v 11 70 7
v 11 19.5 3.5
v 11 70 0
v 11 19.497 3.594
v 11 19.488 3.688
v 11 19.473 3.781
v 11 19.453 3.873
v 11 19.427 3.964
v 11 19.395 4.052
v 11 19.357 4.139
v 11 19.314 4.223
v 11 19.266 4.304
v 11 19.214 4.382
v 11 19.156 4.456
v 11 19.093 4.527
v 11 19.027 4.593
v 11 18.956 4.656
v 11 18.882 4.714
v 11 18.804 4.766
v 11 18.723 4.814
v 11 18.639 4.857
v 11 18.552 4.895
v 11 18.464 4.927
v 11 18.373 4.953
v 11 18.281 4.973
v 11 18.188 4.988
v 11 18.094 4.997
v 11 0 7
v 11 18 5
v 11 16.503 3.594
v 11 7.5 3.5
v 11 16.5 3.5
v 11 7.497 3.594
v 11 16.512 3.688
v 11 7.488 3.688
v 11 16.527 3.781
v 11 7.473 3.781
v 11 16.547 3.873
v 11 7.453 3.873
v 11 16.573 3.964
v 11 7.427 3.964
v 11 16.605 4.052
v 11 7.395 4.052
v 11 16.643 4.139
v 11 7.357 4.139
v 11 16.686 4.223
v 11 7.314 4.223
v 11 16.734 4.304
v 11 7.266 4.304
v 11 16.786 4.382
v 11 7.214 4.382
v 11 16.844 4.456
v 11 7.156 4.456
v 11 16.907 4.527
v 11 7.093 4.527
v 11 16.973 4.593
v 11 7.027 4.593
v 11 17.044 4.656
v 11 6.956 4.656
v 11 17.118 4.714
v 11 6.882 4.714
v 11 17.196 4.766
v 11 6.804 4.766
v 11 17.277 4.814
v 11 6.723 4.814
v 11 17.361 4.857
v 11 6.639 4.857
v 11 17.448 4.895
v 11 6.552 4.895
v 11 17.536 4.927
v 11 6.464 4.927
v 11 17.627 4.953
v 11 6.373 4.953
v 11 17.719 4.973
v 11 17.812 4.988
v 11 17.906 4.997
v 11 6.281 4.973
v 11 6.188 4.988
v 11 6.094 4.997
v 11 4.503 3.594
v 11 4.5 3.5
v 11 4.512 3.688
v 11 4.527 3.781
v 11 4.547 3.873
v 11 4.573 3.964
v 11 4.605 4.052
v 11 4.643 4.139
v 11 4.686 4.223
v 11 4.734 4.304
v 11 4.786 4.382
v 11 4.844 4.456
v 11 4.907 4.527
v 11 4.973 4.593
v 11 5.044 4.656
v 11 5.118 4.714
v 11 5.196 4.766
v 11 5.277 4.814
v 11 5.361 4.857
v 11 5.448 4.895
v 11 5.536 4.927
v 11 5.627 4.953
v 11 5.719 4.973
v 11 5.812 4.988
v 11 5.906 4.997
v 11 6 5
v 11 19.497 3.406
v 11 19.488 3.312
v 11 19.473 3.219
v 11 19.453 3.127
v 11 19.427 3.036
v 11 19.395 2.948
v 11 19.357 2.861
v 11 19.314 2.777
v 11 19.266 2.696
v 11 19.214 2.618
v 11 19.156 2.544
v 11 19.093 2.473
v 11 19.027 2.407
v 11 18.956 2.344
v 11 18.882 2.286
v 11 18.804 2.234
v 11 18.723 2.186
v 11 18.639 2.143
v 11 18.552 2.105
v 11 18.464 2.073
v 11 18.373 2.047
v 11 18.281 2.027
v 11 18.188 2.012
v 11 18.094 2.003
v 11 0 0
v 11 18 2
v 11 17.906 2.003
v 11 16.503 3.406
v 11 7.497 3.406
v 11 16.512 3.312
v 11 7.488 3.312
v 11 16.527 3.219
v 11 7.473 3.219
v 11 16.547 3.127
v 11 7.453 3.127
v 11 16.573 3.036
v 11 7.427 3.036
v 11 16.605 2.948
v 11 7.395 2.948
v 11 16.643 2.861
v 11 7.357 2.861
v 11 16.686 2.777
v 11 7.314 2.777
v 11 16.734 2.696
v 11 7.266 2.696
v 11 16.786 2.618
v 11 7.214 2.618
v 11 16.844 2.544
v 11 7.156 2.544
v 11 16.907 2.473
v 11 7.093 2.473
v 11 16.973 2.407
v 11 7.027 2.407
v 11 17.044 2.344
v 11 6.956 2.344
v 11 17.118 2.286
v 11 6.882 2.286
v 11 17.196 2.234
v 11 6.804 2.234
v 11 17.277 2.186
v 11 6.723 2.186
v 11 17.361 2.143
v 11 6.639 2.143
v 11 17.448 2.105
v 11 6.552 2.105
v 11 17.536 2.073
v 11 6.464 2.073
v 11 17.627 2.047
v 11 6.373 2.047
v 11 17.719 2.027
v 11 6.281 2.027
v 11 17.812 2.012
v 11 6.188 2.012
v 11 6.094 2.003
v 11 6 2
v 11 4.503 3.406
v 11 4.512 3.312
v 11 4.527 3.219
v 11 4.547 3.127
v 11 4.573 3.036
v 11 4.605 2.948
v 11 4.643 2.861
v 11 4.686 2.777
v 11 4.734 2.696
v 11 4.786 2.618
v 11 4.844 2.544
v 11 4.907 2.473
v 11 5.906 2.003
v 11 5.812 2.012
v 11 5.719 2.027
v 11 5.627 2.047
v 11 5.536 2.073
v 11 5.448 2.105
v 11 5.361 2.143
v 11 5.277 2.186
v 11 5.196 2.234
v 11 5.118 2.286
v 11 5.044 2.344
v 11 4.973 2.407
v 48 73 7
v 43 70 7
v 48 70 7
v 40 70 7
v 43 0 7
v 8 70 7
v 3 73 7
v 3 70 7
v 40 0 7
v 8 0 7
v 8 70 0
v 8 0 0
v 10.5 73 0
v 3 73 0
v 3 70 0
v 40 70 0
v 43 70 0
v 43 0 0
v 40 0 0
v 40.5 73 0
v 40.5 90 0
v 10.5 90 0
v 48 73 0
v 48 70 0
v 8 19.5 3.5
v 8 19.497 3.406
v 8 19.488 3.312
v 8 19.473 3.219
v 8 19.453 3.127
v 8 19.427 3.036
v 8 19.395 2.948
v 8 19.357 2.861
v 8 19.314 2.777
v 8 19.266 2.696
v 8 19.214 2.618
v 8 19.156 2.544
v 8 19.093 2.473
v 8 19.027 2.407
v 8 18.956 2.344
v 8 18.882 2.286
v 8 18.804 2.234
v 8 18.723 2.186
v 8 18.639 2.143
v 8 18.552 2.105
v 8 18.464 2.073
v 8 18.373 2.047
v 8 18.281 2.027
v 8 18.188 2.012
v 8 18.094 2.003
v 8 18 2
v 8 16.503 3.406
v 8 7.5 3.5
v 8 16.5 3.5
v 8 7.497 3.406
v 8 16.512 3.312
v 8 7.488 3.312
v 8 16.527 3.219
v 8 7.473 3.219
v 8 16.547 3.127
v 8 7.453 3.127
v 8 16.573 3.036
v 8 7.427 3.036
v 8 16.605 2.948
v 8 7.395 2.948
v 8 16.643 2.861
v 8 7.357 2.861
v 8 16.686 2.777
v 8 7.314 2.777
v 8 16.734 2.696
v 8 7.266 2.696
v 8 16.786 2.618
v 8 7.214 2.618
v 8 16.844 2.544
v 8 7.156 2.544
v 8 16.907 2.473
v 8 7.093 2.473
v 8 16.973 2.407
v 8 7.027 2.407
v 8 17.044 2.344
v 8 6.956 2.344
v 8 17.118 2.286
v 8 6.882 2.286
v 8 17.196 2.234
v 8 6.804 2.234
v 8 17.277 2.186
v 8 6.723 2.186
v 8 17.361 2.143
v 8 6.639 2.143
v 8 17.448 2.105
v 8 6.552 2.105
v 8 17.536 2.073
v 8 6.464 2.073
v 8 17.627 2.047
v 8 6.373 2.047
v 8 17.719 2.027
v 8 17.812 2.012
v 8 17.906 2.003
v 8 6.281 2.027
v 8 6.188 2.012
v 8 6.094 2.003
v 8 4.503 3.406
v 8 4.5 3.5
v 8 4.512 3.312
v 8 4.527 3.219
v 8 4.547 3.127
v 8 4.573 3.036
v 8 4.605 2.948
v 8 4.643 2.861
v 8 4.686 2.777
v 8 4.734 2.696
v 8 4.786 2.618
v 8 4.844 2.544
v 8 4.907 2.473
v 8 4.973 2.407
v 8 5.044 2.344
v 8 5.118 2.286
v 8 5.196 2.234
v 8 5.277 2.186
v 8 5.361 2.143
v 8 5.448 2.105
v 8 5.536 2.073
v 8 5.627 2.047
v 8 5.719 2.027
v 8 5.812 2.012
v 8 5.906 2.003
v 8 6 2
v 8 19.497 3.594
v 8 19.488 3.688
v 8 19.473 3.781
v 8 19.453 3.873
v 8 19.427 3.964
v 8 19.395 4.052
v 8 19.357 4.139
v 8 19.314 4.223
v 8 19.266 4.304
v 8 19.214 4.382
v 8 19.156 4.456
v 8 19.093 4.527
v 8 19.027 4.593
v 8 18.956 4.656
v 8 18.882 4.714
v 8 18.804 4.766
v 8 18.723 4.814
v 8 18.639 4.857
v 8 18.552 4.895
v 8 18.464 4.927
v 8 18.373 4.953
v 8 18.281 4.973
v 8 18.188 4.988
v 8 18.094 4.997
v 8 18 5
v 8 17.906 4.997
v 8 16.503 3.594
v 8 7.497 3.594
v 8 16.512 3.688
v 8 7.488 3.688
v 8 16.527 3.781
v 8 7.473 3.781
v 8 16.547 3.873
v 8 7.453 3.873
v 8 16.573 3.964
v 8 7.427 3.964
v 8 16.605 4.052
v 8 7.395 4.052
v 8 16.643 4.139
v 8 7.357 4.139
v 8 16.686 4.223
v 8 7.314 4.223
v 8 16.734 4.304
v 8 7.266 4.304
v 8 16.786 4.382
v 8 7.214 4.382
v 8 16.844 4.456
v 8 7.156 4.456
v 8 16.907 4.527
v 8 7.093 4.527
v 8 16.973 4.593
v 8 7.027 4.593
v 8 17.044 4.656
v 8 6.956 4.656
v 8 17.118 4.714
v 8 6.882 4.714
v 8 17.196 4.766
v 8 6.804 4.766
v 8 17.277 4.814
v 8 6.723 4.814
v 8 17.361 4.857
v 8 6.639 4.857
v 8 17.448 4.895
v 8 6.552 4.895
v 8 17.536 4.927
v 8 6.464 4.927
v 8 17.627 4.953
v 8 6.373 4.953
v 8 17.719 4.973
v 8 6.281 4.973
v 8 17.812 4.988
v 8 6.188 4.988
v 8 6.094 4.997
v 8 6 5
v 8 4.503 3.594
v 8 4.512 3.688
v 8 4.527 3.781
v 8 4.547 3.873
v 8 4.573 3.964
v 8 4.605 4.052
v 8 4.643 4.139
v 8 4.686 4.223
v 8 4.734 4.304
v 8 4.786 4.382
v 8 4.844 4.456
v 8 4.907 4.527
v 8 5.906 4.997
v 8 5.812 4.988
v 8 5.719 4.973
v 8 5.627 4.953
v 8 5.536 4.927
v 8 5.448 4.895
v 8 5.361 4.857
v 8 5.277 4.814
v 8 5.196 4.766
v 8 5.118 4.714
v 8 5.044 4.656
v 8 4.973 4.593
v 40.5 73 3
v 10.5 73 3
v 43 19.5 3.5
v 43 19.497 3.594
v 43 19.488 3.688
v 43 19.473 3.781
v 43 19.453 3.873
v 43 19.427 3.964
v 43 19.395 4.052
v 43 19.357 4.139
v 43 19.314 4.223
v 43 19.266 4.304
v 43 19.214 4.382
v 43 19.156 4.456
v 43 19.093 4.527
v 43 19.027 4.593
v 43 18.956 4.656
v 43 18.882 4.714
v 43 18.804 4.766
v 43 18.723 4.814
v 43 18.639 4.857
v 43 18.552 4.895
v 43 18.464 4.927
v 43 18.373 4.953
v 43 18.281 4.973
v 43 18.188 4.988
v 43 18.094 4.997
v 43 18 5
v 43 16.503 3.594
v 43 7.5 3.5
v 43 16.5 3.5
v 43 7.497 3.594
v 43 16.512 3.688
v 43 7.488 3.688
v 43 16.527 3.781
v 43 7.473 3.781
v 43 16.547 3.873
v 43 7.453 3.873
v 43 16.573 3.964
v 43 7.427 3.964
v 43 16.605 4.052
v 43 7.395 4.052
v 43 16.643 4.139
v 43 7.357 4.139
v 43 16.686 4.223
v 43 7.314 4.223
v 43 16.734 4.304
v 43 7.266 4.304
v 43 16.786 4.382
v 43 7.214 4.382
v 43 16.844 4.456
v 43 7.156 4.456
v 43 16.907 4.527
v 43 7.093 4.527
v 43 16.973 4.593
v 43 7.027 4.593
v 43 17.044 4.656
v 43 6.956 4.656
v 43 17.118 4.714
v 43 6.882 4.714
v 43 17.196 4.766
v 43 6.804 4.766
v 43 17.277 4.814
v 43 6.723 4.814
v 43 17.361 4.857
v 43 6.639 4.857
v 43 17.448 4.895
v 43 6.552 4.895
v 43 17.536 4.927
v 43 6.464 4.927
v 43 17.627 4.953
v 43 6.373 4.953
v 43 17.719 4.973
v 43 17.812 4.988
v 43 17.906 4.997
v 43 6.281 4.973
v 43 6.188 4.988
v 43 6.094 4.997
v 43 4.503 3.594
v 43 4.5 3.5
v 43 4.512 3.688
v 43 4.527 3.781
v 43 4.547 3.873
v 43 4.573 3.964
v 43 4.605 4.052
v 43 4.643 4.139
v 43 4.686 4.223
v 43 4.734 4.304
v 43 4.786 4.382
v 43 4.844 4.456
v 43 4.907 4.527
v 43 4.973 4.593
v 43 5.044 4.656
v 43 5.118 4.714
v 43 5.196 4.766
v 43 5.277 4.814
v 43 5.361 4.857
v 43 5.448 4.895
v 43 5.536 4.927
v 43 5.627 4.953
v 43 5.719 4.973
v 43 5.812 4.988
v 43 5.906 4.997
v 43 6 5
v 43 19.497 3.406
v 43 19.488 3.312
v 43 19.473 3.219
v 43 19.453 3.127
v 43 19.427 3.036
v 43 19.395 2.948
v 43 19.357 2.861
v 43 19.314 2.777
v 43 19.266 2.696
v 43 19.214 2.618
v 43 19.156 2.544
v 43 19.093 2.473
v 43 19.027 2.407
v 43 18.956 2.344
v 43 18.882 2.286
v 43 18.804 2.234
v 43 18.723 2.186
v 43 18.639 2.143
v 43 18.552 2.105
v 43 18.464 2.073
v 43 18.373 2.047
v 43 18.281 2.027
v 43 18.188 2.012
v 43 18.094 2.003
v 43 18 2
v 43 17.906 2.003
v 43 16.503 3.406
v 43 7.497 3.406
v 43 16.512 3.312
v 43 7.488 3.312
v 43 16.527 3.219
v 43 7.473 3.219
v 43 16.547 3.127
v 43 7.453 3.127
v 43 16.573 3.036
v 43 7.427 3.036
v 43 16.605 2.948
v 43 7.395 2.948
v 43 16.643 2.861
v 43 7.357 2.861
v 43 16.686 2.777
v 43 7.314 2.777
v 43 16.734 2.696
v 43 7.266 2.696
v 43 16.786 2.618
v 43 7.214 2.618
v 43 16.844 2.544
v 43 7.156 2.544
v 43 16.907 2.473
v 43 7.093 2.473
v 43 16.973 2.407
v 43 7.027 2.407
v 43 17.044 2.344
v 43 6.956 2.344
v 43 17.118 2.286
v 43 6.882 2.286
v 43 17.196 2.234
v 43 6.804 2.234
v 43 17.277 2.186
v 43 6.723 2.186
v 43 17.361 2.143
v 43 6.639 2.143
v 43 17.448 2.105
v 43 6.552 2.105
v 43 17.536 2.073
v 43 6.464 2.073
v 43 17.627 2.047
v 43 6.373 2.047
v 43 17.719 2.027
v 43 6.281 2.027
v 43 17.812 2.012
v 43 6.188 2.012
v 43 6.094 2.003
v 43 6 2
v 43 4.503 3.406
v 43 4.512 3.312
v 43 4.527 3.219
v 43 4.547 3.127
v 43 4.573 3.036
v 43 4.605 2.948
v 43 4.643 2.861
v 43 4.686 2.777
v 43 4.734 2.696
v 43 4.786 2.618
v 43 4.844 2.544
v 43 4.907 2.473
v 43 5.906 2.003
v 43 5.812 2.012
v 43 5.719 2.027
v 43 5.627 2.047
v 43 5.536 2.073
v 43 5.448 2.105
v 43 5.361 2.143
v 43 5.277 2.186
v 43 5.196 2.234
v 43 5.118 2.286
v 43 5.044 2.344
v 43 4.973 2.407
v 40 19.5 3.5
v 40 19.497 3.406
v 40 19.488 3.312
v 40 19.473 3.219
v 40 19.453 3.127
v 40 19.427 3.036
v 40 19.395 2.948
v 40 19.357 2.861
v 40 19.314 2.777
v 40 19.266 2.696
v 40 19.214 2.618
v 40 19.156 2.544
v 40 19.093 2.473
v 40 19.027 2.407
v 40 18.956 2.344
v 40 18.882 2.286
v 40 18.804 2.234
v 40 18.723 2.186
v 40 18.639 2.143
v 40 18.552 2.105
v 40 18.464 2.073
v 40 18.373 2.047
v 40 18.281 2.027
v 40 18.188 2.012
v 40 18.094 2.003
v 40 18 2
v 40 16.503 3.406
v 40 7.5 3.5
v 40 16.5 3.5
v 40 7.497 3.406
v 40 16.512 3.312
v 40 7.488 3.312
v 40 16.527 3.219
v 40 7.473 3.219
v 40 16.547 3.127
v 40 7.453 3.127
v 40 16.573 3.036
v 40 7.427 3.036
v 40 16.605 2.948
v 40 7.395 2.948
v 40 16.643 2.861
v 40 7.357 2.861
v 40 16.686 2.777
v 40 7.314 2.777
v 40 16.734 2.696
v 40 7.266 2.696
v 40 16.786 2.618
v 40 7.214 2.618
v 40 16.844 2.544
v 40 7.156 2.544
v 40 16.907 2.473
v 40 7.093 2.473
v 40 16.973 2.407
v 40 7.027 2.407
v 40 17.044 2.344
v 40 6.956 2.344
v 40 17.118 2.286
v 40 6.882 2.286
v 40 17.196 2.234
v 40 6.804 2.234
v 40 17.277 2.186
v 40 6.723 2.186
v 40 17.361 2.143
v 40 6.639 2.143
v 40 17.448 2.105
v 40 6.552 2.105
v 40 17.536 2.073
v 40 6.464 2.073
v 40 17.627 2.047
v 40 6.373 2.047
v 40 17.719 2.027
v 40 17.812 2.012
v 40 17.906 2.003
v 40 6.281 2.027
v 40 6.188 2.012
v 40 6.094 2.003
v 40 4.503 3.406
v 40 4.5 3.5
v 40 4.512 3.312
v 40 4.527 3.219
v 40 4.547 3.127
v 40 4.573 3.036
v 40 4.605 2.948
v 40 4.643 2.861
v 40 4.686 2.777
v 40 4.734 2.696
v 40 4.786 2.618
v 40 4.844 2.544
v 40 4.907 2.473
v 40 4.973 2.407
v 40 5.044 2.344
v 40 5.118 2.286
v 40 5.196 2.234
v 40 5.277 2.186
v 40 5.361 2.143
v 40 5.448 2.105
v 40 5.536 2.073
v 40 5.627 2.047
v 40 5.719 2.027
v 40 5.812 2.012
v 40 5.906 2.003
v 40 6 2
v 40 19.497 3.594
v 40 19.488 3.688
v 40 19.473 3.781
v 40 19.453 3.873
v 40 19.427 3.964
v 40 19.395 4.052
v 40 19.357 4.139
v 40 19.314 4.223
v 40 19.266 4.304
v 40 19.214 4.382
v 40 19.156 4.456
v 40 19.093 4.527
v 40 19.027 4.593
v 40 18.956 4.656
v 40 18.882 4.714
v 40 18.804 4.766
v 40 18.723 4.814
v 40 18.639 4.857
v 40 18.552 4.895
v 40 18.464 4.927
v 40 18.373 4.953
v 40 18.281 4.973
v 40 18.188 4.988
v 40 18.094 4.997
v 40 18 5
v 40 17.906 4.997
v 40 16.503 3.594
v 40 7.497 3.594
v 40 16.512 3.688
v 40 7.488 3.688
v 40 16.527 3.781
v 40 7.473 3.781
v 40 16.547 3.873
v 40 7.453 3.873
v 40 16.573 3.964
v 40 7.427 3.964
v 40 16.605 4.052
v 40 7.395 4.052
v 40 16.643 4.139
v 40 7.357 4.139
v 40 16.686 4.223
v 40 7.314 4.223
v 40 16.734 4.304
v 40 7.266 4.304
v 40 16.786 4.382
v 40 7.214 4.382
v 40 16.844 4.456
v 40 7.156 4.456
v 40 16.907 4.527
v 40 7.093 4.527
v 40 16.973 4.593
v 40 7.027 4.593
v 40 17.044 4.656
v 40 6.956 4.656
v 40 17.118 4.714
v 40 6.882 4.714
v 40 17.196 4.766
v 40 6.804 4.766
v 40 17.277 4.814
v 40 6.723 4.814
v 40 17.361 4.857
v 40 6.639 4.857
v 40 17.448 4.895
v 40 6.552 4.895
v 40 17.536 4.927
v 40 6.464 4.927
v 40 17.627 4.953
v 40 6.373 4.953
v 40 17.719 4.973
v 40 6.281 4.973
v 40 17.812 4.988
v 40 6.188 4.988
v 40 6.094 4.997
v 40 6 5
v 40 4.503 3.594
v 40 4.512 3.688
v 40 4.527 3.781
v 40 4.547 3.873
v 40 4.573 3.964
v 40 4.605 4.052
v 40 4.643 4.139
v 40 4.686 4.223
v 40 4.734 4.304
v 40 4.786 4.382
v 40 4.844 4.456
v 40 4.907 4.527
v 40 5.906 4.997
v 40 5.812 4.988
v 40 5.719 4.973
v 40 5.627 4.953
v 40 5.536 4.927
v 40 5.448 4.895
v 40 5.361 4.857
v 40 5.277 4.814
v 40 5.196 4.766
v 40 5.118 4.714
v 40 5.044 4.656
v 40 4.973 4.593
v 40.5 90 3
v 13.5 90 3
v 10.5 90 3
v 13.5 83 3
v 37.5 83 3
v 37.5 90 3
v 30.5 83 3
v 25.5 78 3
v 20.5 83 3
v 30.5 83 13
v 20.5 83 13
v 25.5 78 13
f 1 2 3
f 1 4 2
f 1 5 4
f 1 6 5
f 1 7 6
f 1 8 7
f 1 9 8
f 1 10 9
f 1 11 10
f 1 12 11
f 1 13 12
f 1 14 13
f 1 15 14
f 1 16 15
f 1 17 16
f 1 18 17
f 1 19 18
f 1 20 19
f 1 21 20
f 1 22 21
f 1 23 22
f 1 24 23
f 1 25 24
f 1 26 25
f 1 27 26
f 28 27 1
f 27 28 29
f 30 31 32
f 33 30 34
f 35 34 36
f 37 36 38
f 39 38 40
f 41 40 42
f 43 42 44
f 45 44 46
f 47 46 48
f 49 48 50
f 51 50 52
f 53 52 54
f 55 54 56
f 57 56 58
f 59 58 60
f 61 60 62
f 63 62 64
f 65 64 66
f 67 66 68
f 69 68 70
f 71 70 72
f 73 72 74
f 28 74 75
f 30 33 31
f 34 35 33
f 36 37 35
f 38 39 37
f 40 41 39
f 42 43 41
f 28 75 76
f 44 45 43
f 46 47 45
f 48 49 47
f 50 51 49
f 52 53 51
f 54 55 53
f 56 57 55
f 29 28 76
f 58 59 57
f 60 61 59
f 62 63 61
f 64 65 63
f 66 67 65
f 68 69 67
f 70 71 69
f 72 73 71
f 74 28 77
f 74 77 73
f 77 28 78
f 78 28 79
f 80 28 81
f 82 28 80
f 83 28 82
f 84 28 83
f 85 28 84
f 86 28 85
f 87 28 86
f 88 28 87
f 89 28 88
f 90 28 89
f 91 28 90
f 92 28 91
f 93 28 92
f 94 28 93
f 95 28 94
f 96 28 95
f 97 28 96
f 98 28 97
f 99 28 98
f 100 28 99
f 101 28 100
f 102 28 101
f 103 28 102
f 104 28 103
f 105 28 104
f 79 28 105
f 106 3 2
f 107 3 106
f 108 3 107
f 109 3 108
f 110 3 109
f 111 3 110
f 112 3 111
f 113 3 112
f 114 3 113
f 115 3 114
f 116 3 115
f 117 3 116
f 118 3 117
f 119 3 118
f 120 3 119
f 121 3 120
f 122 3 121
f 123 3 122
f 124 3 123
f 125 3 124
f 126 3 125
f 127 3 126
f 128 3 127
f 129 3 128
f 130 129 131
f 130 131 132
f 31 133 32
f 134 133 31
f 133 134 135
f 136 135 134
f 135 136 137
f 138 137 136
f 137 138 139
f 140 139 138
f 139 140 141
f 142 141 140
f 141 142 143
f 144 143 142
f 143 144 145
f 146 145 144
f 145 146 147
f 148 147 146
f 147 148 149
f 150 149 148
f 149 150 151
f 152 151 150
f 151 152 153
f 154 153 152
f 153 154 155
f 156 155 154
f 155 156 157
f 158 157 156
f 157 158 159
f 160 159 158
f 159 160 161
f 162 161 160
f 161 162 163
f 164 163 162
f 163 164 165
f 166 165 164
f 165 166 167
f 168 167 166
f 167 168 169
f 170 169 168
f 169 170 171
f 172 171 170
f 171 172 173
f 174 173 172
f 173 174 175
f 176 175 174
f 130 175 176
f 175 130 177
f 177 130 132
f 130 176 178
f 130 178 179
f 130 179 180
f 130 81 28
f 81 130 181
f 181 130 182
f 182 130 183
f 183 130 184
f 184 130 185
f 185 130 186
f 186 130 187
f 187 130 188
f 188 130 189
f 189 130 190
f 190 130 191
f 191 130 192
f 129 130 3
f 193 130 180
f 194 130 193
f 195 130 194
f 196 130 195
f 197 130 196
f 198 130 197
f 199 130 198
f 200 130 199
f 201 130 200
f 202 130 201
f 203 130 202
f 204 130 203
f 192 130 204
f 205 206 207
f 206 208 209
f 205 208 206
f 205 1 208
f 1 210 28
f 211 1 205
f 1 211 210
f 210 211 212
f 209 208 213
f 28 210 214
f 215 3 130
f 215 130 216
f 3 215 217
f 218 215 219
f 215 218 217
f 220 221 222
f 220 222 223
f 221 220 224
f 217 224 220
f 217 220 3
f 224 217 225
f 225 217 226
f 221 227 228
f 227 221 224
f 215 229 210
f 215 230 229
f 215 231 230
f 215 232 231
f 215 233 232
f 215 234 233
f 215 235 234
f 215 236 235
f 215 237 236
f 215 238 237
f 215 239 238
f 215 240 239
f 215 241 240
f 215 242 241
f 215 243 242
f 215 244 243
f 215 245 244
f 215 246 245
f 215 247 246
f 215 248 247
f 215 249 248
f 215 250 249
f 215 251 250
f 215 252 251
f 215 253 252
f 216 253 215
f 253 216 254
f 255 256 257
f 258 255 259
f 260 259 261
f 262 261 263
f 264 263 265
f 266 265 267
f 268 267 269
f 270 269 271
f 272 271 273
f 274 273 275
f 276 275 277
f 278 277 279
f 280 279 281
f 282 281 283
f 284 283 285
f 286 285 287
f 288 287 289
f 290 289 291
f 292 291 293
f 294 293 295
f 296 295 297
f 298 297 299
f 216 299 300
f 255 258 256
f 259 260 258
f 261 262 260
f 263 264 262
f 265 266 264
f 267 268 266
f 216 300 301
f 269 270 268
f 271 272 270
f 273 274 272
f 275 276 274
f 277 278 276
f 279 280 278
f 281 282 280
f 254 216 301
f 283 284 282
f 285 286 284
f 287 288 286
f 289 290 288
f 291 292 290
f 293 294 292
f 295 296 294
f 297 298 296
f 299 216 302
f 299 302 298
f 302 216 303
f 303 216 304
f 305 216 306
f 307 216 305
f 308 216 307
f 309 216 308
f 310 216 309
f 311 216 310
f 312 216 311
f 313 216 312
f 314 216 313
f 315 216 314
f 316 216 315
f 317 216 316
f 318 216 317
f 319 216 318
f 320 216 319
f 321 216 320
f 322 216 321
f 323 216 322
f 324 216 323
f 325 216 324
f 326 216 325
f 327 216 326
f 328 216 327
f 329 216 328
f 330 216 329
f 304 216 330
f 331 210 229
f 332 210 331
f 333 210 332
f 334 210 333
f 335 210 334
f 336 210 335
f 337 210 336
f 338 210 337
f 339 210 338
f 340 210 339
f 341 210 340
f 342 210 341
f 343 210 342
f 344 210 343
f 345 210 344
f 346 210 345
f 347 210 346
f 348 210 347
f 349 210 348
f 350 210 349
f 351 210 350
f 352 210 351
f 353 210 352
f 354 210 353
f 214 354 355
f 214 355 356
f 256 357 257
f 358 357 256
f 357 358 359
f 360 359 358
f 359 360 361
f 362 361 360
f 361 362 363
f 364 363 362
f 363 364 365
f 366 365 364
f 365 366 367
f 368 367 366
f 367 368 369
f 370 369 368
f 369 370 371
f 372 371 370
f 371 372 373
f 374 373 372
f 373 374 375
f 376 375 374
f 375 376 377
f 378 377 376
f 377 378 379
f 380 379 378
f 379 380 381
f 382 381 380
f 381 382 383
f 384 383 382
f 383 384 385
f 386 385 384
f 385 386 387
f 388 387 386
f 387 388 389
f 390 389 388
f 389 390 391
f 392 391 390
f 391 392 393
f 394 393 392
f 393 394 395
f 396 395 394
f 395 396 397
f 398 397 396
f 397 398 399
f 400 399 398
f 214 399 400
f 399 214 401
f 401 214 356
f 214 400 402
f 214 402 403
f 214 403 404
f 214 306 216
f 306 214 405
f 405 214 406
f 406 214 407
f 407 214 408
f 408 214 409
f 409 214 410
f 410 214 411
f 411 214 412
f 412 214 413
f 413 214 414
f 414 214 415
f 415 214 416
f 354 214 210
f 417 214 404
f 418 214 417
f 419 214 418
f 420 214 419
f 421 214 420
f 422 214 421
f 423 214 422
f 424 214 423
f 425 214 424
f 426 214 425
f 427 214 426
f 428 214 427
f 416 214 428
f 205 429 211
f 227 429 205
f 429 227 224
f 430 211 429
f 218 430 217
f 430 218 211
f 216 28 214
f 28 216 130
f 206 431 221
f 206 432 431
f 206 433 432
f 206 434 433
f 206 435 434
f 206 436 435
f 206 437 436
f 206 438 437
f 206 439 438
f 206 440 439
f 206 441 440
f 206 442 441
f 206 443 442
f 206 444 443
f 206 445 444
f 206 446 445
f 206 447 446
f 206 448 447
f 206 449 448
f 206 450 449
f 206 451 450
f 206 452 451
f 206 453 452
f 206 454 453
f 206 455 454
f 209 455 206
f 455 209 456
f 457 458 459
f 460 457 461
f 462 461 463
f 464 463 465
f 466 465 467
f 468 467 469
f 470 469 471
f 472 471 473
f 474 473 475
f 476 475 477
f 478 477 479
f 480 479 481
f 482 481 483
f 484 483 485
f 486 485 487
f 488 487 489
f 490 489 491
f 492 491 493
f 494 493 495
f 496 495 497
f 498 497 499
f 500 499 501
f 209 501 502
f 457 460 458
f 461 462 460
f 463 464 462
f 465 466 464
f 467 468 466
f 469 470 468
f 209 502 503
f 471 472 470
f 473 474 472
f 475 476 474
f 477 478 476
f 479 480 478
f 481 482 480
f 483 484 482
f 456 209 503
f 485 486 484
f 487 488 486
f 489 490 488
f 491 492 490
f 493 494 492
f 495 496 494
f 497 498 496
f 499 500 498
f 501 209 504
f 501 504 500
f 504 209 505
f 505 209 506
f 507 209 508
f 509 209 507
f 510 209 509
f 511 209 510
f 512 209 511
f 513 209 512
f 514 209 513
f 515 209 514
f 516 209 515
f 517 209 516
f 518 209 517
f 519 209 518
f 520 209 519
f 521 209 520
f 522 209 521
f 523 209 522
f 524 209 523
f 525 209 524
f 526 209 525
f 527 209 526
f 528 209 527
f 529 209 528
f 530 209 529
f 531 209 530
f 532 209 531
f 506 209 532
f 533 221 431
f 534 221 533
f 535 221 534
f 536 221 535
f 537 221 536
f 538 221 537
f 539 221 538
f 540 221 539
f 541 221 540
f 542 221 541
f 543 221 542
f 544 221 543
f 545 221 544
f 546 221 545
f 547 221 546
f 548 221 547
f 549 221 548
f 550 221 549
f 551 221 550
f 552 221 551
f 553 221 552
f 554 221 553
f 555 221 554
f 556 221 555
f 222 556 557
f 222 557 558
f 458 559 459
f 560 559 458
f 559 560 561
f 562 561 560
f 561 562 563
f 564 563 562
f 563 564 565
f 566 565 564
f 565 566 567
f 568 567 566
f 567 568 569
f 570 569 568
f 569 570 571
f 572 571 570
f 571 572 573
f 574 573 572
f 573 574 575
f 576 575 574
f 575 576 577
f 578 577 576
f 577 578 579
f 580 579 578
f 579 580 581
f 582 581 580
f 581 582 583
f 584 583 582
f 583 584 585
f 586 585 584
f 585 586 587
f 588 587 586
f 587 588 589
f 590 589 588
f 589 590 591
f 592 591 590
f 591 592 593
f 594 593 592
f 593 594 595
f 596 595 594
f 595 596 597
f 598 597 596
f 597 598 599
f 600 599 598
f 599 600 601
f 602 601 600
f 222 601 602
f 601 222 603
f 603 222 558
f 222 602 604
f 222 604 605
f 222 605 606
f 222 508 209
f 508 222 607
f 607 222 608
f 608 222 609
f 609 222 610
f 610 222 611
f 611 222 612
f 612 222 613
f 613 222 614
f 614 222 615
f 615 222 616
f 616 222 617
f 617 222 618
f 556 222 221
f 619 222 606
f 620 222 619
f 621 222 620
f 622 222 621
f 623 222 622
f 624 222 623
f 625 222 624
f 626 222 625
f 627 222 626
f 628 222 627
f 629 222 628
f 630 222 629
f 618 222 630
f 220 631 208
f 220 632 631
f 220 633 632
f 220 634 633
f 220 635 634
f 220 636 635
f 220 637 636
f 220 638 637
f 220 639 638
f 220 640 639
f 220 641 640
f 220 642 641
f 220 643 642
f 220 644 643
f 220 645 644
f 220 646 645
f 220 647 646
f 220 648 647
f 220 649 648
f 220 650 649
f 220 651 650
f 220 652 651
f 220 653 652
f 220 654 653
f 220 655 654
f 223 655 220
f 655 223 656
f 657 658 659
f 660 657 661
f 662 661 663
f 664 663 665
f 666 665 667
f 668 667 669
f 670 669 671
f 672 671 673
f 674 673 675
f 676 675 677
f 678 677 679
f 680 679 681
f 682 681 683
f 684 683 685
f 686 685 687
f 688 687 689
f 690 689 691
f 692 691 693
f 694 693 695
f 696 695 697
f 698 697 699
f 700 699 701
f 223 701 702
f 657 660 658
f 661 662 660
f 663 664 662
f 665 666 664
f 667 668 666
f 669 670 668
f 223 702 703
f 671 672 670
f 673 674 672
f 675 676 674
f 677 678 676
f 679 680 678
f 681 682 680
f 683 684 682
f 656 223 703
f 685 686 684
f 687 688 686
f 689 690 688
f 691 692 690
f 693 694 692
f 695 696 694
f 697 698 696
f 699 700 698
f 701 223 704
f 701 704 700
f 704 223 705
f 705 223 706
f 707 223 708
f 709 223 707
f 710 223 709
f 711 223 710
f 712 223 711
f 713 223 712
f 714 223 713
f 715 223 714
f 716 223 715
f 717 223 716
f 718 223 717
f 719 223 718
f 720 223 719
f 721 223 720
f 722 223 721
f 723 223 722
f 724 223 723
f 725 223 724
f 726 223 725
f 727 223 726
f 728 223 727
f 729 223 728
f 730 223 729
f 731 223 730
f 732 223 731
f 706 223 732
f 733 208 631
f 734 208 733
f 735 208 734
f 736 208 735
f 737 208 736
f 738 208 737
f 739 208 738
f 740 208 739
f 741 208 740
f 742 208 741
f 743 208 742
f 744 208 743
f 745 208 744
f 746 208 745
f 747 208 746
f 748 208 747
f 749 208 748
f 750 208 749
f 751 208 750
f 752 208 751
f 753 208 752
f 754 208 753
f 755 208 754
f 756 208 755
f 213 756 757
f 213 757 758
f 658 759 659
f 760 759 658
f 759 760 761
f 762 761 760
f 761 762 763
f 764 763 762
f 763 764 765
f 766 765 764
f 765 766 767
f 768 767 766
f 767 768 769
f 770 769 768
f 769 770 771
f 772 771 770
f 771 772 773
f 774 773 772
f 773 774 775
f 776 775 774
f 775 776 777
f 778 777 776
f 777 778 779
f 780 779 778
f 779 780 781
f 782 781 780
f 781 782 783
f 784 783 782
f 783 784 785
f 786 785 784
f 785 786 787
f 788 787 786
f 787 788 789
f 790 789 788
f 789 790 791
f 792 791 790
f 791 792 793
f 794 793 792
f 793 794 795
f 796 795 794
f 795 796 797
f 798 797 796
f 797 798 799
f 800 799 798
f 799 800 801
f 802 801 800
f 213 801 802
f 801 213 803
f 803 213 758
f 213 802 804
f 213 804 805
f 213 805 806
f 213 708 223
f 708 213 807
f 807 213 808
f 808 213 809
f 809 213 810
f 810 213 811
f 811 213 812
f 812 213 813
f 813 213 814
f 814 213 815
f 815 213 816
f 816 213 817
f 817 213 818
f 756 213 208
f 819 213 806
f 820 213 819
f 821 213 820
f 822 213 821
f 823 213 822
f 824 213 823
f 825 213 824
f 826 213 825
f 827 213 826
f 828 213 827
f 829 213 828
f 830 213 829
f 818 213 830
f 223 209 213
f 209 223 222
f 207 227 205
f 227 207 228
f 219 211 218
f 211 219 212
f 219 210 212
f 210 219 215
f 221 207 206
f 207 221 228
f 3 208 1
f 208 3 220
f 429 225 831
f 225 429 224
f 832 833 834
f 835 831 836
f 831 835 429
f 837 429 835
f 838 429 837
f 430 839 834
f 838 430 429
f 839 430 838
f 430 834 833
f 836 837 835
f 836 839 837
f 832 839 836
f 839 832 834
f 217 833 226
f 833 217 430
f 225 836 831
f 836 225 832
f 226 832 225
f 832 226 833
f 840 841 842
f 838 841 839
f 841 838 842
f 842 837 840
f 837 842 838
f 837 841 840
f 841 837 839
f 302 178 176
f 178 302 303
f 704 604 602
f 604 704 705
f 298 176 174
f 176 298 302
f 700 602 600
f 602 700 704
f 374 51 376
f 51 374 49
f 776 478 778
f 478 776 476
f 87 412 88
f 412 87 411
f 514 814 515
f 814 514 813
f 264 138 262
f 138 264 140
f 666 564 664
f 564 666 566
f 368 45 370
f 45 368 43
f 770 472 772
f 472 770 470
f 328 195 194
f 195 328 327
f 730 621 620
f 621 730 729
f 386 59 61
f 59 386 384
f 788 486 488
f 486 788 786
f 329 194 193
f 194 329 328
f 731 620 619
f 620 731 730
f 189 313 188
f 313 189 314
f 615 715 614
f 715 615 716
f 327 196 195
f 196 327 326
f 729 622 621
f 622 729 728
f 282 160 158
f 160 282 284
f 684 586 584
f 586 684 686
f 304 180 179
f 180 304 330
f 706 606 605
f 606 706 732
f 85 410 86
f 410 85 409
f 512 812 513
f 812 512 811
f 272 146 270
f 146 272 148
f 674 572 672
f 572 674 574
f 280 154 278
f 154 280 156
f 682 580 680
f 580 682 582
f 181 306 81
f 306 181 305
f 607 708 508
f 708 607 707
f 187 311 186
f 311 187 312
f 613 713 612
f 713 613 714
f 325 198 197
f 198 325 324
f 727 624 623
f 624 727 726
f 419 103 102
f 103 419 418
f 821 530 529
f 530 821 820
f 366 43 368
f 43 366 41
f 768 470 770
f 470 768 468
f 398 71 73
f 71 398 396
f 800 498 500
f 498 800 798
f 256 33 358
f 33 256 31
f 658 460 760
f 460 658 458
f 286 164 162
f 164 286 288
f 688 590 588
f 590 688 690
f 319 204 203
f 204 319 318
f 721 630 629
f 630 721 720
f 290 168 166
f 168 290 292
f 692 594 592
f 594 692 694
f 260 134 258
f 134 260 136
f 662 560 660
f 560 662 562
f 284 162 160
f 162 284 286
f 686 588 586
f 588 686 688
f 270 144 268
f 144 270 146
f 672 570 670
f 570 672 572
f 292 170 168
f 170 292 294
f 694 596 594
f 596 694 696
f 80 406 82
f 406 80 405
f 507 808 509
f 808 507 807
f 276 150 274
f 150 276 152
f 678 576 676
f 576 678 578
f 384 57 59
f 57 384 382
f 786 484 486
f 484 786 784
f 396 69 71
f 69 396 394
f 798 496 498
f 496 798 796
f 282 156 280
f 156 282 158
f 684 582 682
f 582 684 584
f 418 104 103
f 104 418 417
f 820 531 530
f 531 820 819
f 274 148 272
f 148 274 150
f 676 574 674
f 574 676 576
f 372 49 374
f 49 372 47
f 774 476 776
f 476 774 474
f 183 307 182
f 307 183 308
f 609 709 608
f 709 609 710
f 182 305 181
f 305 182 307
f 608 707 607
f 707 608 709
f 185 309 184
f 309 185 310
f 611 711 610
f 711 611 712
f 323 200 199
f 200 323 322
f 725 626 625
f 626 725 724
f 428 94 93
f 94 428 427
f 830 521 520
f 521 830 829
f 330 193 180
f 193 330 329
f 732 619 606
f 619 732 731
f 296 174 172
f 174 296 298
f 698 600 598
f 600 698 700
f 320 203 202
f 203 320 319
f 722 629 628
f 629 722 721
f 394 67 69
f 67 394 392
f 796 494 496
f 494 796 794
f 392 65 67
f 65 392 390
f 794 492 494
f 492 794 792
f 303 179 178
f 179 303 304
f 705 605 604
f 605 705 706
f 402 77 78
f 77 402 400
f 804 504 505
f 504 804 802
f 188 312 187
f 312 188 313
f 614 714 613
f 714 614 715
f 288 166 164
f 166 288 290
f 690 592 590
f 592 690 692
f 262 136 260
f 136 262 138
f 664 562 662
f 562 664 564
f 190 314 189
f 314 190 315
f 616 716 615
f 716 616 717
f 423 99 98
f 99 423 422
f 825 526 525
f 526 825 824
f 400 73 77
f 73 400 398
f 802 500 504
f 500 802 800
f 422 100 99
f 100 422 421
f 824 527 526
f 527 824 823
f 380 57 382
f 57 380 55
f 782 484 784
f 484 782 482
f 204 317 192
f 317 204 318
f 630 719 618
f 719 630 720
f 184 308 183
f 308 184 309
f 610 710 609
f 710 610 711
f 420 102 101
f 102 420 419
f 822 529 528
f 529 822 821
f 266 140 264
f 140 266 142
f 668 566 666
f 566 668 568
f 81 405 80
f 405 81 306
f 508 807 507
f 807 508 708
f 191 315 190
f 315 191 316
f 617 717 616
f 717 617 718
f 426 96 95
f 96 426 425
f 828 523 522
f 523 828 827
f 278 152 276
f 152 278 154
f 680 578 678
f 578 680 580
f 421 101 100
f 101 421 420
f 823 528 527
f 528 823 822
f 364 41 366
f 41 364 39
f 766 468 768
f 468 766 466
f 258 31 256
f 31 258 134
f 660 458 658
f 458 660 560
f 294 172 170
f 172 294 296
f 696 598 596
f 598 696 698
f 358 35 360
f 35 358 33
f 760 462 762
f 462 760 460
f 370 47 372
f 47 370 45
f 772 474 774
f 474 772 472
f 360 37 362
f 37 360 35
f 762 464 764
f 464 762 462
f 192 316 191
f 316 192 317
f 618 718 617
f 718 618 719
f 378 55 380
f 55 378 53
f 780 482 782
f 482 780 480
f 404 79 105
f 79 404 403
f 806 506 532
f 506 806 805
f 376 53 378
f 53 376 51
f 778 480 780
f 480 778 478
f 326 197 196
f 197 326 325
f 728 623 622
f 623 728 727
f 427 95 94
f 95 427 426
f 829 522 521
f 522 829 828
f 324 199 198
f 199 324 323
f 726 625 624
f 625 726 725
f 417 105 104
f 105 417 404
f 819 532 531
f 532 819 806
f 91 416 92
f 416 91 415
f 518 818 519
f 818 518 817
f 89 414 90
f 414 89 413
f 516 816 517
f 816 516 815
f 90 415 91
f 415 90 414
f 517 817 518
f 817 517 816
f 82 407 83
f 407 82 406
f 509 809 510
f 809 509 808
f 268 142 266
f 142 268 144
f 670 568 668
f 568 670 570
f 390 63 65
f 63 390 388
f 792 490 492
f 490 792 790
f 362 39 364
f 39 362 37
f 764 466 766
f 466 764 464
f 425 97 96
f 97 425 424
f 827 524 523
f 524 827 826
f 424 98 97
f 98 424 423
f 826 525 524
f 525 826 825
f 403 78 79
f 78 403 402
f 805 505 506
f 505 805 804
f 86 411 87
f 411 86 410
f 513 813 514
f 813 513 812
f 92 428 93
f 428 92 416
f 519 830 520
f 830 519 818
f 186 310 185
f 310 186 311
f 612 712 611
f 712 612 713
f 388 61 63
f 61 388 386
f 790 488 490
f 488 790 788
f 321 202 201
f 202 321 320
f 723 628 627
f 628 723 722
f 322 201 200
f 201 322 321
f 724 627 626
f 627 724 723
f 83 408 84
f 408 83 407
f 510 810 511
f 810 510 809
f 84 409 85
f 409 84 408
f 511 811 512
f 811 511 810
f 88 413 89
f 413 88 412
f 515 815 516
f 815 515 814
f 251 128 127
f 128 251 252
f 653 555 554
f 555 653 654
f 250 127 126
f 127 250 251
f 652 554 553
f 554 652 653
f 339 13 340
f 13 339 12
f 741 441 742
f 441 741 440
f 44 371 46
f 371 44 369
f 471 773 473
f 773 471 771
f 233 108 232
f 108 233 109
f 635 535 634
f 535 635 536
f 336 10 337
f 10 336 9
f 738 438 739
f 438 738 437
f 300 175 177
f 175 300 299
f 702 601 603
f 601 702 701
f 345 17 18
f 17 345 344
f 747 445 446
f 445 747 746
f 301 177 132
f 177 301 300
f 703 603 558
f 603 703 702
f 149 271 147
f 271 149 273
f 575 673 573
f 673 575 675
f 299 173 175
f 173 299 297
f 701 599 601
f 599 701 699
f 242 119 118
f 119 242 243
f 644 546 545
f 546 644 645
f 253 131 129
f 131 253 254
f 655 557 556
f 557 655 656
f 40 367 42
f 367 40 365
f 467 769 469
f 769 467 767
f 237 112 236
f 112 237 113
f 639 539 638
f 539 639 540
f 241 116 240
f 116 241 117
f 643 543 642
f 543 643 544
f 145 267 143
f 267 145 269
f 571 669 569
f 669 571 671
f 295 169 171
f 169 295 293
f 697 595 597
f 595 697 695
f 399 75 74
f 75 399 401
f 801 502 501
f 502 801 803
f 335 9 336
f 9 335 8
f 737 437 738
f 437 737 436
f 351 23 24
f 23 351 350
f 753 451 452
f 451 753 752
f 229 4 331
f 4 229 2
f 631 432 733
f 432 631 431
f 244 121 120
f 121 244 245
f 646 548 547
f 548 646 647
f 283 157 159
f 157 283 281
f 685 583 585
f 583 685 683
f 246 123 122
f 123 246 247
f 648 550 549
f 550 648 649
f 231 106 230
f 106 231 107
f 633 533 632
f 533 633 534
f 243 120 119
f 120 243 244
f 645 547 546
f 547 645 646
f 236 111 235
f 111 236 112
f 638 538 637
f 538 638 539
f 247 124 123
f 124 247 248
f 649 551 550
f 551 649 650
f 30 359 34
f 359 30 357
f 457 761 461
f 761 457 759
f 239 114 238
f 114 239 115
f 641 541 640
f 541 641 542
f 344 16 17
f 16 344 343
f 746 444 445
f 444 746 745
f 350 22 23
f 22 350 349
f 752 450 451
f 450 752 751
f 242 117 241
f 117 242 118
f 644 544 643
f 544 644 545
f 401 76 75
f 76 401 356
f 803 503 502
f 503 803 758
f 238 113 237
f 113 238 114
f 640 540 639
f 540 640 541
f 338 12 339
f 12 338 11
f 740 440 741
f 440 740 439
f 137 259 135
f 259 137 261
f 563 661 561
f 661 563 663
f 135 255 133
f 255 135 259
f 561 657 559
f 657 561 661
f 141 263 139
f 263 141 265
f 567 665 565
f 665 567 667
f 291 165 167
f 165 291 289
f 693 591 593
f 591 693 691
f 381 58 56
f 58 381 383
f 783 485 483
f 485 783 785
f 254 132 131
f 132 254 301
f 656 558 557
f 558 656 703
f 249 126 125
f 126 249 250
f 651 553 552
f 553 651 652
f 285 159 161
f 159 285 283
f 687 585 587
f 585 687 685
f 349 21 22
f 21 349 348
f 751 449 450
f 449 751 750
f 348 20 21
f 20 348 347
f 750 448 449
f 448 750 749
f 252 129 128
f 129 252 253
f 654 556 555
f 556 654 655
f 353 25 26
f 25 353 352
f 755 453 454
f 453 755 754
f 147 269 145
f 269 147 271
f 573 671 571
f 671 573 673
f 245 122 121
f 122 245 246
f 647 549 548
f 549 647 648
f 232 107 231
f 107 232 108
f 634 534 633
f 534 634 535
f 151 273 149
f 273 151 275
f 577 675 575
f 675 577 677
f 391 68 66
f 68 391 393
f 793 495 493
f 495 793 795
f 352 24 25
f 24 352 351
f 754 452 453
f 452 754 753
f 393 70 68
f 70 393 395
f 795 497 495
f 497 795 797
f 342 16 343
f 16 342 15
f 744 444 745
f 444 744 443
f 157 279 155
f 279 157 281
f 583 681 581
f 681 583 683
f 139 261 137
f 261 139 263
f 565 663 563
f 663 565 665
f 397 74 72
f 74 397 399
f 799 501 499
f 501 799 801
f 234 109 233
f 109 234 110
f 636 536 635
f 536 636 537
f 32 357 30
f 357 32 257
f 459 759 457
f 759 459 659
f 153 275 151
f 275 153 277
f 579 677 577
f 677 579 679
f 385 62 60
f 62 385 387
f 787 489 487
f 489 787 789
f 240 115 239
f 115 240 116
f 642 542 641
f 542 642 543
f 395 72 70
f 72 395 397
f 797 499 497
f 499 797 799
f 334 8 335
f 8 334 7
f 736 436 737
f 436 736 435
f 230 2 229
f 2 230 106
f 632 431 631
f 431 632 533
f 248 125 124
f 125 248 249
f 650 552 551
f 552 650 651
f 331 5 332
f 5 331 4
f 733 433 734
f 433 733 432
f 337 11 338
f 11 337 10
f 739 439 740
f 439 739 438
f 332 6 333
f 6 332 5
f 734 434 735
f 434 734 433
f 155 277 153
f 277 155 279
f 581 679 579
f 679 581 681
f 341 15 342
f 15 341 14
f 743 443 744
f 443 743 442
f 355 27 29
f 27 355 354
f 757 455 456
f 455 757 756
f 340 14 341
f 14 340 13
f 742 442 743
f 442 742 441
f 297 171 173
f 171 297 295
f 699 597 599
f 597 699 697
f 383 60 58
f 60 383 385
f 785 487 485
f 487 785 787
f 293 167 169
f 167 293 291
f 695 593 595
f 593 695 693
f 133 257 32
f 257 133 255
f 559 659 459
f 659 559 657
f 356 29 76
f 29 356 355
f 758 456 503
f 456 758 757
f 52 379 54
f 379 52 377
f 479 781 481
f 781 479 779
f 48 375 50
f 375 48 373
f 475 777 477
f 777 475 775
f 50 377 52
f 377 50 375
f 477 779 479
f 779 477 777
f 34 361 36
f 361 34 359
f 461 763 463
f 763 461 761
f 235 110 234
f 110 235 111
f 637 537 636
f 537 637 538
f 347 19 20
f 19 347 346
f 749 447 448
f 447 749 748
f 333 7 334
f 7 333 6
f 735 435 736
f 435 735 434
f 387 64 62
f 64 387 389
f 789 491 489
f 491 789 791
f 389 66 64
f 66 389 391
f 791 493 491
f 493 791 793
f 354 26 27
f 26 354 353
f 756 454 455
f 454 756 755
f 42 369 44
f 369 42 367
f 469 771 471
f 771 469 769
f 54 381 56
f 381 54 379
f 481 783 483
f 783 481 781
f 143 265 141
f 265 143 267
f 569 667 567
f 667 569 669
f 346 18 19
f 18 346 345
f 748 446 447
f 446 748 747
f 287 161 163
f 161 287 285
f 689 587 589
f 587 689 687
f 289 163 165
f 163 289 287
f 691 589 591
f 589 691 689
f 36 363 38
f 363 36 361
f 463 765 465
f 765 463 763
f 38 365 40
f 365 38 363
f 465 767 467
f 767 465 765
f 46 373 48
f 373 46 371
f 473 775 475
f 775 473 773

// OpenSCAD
difference(){
	union(){ 

        translate([8,0,0]){
           cube([3,58+15,7], center=false);
        }                
        translate([3+45-8,0,0]){
           cube([3,58+15,7], center=false);
        }                
        translate([3,55+15,0]){
           cube([45,3,7], center=false);
        }                
        translate([3+7.5,58+15,0]){
           cube([30,17,3], center=false);
        }                
        translate([3+7.5+25/2-1-3.5+7,58+15+10-5,3]){
            rotate([0,0,45]){
                cube([10,10,10], center=false);
            }
        }                
            
        
	}
	union() {
        translate([3+7.5+25/2-1-3.5-5,58+15+10,3]){
           cube([24,25,13], center=false);
        }                

        translate([0,12-6,3.5]){
            rotate([0,90,0]){
                cylinder(h=200, r=1.5, $fn=100, center=true);
            }   
        }
        translate([0,12+6,3.5]){
            rotate([0,90,0]){
                cylinder(h=200, r=1.5, $fn=100, center=true);
            }   
        }
//        translate([(51/2-3 + 24/2+3),58+25-3+15,-1]){
//            rotate([0,0,45]){
//                cube([5,5,5], center=false);
//            }
//        }                
//        translate([(51/2-3 - 24/2+3),58+25-3+15,-1]){
//            rotate([0,0,45]){
//                cube([5,5,5], center=false);
//            }
//        }                

	}
}
